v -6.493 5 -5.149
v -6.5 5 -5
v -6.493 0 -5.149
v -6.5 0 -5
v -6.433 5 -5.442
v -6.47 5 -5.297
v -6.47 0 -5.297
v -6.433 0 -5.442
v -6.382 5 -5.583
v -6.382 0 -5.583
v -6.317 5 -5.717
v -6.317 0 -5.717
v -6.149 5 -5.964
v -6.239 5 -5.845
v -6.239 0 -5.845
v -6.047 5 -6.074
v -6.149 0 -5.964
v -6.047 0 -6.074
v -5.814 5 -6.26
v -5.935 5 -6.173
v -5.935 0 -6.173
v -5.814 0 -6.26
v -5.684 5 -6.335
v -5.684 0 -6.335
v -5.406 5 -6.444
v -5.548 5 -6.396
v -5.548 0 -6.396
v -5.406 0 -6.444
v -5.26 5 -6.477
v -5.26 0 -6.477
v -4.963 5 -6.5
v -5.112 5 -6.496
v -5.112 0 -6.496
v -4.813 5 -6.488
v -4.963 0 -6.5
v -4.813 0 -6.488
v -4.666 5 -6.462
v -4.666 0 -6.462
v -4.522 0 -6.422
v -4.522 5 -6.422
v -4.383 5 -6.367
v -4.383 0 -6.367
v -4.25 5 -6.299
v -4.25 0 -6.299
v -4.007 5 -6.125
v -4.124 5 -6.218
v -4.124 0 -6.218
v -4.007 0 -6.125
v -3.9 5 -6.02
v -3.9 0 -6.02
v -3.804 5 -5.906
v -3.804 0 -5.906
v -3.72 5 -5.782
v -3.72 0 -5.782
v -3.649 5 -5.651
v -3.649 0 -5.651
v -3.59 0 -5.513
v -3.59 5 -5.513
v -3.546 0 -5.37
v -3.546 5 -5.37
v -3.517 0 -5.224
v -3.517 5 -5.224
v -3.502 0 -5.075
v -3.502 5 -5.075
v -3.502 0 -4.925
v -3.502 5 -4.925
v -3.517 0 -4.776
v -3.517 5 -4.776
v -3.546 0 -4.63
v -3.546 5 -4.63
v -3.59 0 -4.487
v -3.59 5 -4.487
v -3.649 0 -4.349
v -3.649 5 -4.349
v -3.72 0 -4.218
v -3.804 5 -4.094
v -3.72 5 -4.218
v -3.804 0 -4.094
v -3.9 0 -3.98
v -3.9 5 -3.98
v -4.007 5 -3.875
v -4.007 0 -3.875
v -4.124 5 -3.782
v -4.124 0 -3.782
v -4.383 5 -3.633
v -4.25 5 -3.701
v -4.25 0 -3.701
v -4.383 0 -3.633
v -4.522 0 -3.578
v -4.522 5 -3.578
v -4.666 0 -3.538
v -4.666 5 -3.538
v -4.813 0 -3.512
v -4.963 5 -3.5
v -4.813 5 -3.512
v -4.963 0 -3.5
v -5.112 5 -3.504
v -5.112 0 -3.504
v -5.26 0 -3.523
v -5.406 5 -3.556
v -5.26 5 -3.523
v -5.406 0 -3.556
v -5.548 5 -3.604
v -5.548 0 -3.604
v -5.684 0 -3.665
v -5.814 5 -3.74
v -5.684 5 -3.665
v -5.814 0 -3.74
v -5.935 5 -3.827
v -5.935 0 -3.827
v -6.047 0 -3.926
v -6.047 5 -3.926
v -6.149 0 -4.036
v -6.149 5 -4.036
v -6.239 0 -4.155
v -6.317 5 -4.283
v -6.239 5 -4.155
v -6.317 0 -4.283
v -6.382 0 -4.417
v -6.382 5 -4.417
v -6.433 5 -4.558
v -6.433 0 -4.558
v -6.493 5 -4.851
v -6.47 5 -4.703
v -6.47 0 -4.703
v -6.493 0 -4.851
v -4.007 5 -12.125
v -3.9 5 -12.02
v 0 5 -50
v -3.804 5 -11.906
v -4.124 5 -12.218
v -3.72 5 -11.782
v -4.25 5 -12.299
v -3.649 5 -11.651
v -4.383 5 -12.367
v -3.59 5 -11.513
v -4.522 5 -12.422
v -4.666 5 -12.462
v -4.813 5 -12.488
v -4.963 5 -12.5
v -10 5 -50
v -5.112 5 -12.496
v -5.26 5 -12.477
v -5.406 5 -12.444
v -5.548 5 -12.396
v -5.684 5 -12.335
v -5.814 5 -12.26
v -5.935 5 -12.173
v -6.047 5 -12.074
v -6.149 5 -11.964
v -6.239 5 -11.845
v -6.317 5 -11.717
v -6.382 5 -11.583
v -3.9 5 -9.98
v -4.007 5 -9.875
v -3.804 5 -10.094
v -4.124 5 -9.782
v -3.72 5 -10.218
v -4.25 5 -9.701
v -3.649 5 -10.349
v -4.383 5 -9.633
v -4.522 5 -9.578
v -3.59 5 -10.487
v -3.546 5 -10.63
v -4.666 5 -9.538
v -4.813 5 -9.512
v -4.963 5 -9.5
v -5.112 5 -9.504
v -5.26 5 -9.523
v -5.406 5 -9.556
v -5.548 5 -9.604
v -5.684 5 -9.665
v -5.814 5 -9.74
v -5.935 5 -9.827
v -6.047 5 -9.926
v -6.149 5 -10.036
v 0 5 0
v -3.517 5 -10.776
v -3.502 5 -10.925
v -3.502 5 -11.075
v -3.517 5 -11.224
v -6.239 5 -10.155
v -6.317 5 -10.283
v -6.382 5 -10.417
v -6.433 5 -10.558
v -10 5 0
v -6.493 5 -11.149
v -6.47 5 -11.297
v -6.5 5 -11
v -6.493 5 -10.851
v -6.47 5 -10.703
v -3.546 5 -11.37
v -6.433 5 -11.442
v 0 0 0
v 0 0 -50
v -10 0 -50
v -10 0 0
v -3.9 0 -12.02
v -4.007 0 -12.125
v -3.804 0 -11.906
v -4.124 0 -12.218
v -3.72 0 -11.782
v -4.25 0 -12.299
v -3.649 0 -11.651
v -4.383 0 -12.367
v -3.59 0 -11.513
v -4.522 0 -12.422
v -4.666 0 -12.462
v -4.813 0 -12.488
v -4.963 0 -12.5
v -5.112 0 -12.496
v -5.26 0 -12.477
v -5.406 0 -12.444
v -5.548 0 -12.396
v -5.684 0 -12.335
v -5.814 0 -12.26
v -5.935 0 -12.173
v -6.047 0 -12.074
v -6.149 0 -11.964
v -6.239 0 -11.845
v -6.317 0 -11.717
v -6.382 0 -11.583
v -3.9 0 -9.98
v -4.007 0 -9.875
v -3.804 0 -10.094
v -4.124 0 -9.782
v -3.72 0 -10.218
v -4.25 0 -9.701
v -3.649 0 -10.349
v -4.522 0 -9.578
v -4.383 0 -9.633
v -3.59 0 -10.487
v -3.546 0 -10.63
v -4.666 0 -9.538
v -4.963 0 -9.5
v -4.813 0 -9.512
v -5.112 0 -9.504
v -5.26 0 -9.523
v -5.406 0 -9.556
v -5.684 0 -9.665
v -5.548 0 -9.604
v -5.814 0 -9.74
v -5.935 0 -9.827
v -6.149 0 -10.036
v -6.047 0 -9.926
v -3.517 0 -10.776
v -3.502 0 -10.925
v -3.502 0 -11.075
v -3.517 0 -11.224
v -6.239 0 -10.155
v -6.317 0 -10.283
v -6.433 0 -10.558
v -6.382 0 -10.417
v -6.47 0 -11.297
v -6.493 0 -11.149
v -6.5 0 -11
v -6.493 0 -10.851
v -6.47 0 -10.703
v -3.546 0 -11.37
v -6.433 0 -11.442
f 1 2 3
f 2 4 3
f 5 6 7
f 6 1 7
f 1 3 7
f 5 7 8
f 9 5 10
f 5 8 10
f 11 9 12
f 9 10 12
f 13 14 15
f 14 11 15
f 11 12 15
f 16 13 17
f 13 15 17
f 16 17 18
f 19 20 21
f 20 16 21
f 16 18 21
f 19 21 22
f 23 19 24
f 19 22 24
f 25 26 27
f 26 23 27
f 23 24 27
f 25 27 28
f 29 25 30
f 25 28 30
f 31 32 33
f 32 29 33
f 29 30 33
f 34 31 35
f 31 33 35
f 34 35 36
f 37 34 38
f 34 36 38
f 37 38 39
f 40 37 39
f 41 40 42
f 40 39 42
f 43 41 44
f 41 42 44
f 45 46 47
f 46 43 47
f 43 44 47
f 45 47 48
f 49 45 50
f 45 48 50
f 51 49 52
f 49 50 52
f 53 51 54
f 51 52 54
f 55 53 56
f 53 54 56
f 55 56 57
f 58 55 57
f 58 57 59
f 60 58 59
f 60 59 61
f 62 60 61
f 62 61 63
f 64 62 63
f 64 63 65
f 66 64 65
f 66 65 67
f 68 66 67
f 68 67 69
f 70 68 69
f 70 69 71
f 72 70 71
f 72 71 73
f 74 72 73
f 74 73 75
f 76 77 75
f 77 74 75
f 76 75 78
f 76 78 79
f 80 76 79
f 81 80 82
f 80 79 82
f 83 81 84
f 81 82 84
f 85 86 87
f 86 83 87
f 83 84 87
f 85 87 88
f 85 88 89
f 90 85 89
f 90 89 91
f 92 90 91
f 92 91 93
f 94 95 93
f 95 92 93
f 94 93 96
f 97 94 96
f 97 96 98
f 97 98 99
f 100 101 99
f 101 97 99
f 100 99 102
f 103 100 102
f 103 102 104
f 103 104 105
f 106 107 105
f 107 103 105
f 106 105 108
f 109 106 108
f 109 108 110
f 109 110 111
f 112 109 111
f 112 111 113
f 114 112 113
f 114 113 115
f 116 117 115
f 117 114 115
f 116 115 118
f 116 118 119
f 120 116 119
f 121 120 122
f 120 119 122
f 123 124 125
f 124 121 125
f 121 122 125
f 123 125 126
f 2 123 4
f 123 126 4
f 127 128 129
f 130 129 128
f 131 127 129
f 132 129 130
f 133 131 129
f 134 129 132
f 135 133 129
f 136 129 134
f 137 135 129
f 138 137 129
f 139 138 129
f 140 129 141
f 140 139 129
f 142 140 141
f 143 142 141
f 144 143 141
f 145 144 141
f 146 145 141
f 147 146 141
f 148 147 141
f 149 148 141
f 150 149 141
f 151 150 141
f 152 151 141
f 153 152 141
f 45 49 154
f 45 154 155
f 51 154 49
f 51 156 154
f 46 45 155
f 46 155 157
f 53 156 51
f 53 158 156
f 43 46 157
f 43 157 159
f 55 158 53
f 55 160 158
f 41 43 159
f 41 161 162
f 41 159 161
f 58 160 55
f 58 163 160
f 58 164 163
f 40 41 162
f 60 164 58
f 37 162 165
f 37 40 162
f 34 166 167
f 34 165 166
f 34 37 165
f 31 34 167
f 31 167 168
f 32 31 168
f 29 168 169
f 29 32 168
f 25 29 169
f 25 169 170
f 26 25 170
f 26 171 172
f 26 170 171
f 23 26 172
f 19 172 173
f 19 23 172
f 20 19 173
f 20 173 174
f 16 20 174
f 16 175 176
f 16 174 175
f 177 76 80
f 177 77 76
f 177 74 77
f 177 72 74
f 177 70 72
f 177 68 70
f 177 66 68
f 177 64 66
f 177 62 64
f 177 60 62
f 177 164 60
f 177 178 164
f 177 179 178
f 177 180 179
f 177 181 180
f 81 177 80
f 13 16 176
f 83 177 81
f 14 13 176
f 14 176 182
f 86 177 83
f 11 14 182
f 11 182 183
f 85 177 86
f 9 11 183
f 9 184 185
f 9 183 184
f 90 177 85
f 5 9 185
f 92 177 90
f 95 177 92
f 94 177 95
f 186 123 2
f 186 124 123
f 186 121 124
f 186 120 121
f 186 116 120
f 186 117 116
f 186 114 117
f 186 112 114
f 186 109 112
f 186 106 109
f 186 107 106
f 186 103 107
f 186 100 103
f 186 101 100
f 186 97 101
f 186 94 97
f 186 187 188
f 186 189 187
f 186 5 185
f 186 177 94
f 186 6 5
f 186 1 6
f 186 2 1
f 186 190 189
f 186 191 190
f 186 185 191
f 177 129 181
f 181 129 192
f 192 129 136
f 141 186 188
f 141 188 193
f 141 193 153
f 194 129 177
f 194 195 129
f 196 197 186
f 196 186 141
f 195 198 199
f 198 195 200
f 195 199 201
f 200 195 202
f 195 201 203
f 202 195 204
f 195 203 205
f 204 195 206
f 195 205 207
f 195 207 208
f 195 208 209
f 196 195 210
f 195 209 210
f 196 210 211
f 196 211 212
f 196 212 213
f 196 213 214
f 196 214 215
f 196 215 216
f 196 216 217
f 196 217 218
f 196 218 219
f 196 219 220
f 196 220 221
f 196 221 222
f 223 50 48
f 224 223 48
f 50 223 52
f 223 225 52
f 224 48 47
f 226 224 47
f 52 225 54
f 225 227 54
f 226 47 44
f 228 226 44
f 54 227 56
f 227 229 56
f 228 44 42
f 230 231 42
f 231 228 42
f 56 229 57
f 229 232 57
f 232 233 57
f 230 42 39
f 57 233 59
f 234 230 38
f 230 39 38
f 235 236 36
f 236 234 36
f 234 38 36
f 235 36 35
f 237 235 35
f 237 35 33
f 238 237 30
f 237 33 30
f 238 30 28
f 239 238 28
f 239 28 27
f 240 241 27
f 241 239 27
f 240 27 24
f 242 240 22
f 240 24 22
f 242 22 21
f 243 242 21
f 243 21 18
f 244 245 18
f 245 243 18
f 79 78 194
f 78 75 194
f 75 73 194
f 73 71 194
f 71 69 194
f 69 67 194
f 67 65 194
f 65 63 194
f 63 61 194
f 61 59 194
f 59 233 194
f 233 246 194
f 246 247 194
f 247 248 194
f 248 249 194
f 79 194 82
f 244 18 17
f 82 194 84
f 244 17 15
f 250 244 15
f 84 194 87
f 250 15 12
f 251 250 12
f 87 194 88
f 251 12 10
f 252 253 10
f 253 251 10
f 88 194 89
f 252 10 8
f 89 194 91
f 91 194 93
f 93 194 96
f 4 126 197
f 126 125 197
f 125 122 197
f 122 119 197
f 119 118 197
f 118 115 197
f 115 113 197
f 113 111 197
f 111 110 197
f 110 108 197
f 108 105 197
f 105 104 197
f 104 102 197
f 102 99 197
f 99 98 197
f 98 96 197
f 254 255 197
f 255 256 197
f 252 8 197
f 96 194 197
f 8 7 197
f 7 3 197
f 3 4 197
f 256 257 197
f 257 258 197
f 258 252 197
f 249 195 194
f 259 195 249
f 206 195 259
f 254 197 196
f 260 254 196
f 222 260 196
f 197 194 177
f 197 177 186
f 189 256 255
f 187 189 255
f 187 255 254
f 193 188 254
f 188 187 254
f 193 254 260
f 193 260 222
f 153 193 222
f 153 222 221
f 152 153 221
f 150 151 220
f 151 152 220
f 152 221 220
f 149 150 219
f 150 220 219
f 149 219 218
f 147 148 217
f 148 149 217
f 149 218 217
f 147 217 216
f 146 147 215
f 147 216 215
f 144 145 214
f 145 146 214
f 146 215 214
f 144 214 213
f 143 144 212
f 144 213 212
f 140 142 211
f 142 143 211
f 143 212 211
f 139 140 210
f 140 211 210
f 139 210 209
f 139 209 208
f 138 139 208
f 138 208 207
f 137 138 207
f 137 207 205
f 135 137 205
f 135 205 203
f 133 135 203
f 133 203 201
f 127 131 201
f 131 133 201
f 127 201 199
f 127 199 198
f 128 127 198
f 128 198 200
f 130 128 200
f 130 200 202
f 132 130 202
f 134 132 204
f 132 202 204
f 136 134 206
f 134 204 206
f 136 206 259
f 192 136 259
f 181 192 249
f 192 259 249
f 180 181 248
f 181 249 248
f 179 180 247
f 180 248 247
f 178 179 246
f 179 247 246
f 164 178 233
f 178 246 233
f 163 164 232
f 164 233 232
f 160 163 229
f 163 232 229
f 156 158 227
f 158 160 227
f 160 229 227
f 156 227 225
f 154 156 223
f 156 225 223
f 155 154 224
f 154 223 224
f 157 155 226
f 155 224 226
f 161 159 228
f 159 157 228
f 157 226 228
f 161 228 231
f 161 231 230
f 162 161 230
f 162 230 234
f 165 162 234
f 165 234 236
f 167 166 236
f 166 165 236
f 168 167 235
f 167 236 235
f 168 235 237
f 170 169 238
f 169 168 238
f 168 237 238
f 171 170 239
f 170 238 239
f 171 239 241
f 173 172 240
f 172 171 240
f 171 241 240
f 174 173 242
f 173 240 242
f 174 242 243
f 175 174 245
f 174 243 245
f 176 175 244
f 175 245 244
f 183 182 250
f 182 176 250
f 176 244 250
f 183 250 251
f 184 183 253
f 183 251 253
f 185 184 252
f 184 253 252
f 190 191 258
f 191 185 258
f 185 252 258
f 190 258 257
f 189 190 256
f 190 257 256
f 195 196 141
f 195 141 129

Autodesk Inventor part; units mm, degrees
ref_plane "YZ Plane" through (0, 0, 0) normal (1, 0, 0) x (0, 1, 0)
ref_plane "XZ Plane" through (0, 0, 0) normal (0, 1, 0) x (-1, 0, 0)
ref_plane "XY Plane" through (0, 0, 0) normal (0, 0, 1) x (1, 0, 0)
sketch "Sketch1" plane through (0, 0, 0) normal (0, 1, 0) x (-1, 0, 0)
  line L0 (0, 0) -> (10, 0)
  line L1 (10, 0) -> (10, -50)
  line L2 (10, -50) -> (0, -50)
  line L3 (0, -50) -> (0, 0)
  circle A0 centre (5, -5) radius 1.5
  circle A1 centre (5, -11) radius 1.5
  dimension "d0" = 10
  dimension "d1" = 50
  dimension "d4" = 3
  dimension "d5" = 3
  dimension "d6" = 6
  dimension "d7" = 5
  dimension "d8" = 5
extrude "Extrusion2" add sketch "Sketch1" along normal blind 5
properties part number "Soporte3_Dos"
